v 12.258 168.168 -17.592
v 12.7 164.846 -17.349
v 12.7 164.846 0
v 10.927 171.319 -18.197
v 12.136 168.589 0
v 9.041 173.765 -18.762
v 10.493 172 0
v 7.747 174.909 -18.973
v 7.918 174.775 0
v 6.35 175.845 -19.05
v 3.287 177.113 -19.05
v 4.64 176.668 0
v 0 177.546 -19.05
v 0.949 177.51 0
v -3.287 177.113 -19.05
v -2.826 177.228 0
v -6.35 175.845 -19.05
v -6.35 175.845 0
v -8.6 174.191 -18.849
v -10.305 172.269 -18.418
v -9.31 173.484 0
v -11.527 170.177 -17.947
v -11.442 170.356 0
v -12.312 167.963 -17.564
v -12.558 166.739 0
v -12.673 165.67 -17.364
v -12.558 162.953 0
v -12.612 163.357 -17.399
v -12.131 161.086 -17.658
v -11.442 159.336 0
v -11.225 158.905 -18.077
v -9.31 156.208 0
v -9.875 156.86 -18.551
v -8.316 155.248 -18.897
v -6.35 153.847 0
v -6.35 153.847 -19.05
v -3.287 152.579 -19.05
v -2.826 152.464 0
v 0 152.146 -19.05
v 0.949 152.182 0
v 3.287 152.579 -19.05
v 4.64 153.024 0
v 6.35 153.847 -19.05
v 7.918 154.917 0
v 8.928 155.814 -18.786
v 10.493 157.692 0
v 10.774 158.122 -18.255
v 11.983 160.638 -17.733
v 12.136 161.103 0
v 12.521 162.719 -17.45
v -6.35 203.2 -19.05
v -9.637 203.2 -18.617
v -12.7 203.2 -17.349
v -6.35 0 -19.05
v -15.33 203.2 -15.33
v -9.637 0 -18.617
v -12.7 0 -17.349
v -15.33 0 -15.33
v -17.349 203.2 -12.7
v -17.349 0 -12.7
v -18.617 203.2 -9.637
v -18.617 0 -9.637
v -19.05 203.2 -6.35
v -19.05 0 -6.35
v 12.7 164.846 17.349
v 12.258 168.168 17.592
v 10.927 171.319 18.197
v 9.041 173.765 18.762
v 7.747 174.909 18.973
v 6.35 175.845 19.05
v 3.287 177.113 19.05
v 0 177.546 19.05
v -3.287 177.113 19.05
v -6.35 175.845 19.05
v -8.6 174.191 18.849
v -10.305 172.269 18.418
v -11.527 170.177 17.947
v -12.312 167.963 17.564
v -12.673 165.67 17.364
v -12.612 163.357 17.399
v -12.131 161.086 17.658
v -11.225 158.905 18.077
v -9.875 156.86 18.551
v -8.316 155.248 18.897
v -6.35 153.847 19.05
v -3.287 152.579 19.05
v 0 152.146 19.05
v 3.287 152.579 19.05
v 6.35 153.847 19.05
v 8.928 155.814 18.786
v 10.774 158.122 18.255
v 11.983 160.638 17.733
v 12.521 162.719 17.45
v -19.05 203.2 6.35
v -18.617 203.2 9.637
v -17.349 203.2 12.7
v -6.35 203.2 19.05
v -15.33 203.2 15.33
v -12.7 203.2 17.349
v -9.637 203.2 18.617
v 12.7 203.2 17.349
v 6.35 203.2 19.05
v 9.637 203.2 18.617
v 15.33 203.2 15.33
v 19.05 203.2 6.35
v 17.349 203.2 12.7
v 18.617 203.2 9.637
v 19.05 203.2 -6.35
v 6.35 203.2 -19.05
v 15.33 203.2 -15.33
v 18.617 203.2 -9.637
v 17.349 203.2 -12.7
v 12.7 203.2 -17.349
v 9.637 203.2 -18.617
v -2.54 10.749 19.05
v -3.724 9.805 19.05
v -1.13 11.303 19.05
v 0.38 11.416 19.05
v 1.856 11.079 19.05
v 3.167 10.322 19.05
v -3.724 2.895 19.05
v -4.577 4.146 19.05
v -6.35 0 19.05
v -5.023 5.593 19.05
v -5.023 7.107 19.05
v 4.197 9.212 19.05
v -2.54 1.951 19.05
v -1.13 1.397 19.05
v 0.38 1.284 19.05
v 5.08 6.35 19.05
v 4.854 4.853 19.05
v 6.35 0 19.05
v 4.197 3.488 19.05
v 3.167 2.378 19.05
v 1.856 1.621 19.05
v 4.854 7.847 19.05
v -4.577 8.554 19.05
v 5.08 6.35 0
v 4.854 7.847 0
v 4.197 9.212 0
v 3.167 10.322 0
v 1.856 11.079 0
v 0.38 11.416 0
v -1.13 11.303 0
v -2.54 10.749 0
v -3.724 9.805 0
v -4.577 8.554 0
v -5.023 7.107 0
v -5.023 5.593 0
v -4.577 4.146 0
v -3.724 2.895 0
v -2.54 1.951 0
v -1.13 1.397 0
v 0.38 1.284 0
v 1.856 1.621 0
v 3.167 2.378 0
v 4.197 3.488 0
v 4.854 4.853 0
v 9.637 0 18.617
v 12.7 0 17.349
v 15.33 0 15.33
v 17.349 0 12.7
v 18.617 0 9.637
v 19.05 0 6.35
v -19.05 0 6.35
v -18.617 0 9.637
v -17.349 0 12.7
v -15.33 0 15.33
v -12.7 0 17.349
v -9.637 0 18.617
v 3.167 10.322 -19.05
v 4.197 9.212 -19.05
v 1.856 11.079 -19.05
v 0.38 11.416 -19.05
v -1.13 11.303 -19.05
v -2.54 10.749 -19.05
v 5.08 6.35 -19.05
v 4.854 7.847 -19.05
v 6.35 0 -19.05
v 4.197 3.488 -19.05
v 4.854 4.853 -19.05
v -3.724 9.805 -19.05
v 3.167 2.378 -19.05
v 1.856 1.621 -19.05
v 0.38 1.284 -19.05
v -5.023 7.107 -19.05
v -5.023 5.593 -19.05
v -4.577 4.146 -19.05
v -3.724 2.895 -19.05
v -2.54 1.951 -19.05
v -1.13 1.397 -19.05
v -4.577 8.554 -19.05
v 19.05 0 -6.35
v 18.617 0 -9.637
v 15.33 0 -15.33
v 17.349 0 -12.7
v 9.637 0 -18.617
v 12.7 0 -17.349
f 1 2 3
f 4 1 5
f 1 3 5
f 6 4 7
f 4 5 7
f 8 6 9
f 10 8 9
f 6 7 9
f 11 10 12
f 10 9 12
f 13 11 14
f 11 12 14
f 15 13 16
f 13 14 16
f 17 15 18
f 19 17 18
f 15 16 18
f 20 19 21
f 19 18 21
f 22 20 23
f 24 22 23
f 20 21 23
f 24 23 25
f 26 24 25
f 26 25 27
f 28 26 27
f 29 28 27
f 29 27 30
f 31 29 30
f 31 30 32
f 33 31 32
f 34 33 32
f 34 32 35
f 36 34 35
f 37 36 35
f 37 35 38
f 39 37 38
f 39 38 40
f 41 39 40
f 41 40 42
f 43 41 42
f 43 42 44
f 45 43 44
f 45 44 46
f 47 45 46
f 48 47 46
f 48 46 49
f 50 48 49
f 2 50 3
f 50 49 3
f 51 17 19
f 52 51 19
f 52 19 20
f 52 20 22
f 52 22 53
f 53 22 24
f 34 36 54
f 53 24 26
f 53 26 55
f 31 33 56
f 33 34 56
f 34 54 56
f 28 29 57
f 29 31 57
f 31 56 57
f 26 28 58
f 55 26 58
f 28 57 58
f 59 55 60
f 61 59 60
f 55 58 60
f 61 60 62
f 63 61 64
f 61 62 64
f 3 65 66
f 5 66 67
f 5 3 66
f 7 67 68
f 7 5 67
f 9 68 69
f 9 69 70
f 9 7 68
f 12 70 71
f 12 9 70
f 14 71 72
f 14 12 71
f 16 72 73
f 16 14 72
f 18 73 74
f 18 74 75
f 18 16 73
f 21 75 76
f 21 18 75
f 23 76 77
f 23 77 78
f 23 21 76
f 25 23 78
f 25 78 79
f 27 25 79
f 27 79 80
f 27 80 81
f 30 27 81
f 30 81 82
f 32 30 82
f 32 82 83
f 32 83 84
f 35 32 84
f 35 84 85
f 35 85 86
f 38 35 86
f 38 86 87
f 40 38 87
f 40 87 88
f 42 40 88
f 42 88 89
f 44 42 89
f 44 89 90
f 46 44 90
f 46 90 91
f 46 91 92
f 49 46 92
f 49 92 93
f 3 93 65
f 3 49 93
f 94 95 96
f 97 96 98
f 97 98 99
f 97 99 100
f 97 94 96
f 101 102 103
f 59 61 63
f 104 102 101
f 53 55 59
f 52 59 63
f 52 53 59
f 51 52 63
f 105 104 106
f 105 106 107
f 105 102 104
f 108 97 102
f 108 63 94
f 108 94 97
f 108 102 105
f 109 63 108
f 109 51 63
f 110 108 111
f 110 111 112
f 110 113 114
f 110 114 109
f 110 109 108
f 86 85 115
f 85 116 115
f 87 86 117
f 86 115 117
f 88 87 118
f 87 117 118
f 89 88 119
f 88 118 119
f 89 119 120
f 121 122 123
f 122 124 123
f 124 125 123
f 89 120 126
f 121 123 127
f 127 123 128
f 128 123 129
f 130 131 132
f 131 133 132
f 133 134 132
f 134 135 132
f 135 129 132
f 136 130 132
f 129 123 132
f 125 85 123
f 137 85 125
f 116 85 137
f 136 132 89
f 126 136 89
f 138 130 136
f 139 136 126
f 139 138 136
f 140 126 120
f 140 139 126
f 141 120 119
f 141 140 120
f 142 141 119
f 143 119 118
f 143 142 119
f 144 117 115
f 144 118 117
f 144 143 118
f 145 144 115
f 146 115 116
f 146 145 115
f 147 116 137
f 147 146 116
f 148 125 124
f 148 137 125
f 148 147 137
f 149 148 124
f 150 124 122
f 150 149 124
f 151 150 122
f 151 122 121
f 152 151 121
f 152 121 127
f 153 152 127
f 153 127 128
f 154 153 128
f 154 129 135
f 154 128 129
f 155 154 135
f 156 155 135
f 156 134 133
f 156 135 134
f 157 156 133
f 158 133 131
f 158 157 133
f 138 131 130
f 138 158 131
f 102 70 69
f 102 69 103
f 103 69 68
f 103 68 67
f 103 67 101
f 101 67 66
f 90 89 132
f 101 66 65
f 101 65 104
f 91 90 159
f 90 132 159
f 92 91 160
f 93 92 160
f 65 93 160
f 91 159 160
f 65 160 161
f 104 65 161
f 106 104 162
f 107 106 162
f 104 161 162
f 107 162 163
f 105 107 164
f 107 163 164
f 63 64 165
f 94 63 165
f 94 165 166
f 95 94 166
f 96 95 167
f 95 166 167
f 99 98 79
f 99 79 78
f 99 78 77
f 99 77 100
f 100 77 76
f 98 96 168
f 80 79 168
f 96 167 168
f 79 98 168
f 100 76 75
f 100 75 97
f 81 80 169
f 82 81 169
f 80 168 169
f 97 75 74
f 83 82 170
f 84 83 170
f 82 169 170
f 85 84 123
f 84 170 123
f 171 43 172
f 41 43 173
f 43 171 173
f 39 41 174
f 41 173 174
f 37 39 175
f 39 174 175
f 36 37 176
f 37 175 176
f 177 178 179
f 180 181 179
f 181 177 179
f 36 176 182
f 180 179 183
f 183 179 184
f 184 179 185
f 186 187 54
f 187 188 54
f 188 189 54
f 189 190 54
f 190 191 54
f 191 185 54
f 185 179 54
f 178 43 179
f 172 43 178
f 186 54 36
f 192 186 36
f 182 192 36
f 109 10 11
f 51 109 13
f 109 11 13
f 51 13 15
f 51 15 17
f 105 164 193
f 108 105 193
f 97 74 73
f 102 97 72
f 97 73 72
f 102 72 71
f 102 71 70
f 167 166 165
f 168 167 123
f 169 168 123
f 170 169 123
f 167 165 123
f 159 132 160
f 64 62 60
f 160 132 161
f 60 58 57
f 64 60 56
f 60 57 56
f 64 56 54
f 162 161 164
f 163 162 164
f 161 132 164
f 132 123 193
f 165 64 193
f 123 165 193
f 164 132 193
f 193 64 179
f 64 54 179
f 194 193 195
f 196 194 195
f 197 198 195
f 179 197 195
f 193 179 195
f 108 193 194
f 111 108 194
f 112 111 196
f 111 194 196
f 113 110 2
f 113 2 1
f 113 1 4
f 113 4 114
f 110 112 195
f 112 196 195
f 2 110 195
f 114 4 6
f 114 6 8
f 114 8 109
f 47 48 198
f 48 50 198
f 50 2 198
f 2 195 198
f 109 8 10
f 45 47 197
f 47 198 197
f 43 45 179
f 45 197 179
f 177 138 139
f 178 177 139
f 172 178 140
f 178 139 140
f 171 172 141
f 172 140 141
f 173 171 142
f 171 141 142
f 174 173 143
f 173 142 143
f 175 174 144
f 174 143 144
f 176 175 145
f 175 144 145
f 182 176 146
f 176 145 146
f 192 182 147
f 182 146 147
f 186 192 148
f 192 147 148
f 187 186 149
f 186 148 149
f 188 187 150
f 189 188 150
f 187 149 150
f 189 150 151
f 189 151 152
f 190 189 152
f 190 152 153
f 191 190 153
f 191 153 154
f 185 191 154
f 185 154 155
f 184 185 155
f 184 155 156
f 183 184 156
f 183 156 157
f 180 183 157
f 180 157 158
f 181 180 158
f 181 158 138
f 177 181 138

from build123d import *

# Parameters (mm, degrees)
BOSS_EXTRUDE2_DEPTH     = 203.2
SKETCH4_R               = 12.7
SKETCH4_R_2             = 5.08
CUT_EXTRUDE1_DEPTH      = 76.2
CUT_EXTRUDE1_DEPTH_BACK = 92.964


with BuildPart() as part:
    # Sketch1 → Boss-Extrude2 (new body)
    with BuildSketch(Plane(origin=(0, 0, 0), x_dir=(1, 0, 0), z_dir=(0, 1, 0))):
        with BuildLine():
            Line((-6.35, -19.05), (6.35, -19.05))
            ThreePointArc((6.35, -19.05), (15.330256121, -15.330256121), (19.05, -6.35))
            Line((19.05, -6.35), (19.05, 6.35))
            ThreePointArc((19.05, 6.35), (15.330256121, 15.330256121), (6.35, 19.05))
            Line((6.35, 19.05), (-6.35, 19.05))
            ThreePointArc((-6.35, 19.05), (-15.330256121, 15.330256121), (-19.05, 6.35))
            Line((-19.05, 6.35), (-19.05, -6.35))
            ThreePointArc((-19.05, -6.35), (-15.330256121, -15.330256121), (-6.35, -19.05))
        make_face()
    extrude(amount=BOSS_EXTRUDE2_DEPTH)

    # Sketch4 → Cut-Extrude1 (cut, two sides)
    with BuildSketch(Plane.XY) as cut_extrude1_sk:
        with Locations((0, 164.846)):
            Circle(SKETCH4_R)
        with Locations((0, 6.35)):
            Circle(SKETCH4_R_2)
    extrude(amount=CUT_EXTRUDE1_DEPTH, mode=Mode.SUBTRACT)
    extrude(cut_extrude1_sk.sketch, amount=-CUT_EXTRUDE1_DEPTH_BACK, mode=Mode.SUBTRACT)


solid = part.part
